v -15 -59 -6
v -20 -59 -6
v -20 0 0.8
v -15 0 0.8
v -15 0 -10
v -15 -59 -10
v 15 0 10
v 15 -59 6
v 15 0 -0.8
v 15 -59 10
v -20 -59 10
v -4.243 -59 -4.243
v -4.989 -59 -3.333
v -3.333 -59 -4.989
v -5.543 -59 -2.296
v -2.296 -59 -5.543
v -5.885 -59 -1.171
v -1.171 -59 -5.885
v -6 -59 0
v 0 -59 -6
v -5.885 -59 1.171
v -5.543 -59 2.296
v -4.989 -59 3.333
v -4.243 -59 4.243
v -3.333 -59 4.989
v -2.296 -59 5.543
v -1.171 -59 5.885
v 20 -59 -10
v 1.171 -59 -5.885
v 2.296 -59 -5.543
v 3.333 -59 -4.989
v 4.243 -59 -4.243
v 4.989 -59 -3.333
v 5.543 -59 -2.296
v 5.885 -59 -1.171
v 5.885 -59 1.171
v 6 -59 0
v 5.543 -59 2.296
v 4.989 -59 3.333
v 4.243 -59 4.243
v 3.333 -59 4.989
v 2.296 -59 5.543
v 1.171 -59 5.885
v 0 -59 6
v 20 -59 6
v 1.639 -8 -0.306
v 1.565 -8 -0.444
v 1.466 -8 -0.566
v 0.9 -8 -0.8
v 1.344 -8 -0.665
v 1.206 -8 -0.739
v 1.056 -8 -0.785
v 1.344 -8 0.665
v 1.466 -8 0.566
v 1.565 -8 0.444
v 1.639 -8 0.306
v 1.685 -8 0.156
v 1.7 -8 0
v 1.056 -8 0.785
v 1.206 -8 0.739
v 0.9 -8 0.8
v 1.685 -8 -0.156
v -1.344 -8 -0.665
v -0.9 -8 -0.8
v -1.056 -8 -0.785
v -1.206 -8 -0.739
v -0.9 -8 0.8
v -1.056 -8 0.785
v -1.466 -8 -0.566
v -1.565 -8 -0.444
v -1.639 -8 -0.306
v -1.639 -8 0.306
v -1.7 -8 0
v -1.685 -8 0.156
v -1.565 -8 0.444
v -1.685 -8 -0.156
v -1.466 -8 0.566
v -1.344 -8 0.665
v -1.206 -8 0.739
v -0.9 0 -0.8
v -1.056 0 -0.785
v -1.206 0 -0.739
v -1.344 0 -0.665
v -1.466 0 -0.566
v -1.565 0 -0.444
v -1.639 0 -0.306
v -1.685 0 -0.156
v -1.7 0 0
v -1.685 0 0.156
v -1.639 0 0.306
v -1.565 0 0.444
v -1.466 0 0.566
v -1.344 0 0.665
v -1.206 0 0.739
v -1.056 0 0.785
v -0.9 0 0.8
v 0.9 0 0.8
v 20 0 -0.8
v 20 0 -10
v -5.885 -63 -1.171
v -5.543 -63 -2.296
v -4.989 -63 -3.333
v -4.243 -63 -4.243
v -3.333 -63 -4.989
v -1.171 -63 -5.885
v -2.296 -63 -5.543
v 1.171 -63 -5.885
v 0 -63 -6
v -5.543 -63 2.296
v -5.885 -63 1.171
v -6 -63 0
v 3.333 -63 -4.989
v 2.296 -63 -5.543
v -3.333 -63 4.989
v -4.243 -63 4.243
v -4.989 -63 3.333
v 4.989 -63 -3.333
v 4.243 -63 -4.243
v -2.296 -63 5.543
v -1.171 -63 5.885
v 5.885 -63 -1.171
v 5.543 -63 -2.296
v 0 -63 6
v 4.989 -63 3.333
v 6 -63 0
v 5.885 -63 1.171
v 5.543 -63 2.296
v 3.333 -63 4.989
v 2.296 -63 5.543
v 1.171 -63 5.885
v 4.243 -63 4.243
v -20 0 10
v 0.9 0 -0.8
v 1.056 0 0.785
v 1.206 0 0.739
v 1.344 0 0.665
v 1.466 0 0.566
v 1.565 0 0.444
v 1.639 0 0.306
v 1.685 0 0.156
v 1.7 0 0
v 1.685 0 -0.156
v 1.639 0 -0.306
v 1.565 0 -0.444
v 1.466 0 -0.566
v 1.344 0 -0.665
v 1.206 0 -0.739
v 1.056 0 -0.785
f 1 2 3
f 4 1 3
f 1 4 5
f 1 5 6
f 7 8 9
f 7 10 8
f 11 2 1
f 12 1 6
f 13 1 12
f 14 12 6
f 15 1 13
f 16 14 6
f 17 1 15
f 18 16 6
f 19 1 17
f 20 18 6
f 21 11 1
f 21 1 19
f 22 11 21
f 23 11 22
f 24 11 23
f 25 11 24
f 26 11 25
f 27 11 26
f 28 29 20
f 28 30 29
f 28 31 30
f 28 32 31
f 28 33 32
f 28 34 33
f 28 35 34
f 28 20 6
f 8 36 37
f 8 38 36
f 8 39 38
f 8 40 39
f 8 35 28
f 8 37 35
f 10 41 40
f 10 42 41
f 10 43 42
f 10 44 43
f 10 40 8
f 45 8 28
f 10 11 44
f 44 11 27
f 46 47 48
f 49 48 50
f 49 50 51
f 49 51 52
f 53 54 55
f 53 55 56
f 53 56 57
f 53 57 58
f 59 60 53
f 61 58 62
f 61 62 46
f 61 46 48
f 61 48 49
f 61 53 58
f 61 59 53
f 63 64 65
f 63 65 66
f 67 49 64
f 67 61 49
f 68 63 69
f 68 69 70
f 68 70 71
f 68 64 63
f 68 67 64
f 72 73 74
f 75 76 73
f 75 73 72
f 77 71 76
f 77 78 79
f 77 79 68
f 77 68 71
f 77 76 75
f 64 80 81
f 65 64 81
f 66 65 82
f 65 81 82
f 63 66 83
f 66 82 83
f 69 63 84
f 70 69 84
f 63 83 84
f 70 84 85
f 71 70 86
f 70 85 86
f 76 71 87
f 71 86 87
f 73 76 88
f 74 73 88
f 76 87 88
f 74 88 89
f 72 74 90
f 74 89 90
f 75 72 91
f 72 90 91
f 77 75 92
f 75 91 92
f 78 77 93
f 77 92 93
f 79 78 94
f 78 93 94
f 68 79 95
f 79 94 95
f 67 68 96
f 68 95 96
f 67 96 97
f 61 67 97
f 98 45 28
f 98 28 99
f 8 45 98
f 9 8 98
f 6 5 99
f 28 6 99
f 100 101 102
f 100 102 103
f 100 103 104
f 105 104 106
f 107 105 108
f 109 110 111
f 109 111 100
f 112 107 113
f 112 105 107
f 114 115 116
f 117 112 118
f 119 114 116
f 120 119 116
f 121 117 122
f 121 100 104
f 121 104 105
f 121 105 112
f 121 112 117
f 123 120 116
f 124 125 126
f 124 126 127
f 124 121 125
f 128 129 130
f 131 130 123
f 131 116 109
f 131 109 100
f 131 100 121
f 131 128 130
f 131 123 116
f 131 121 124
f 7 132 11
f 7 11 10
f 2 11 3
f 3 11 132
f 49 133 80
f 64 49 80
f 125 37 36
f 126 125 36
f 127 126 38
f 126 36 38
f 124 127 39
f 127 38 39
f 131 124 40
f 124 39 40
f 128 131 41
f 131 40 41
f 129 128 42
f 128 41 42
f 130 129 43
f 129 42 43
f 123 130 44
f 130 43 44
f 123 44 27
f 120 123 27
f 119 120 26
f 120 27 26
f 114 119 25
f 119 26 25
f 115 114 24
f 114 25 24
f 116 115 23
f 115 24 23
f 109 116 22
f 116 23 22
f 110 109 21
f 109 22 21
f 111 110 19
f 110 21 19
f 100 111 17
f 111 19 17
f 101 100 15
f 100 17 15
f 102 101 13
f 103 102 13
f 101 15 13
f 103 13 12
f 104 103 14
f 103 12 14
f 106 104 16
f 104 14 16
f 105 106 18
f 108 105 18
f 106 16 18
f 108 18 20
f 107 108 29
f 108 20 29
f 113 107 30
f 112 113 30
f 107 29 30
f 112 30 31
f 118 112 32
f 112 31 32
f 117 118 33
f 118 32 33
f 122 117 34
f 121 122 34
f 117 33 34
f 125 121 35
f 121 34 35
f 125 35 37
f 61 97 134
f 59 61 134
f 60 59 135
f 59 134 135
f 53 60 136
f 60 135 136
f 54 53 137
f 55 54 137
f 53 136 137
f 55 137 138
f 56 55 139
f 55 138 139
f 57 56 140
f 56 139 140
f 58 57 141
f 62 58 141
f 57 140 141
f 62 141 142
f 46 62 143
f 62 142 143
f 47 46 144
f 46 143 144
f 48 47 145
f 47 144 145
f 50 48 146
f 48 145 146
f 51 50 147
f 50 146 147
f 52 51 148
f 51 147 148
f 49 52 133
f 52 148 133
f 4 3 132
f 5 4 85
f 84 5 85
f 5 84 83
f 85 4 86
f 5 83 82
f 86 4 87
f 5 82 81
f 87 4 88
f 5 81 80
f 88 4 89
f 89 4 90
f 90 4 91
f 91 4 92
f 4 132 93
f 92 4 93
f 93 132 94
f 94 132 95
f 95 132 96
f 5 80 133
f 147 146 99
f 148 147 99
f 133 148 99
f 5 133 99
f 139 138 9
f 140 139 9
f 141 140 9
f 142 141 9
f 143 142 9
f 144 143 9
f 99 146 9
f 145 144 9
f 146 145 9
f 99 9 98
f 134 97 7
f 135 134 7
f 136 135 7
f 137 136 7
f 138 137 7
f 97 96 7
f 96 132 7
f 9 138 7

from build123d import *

# Parameters (mm, degrees)
F0_W     = 40
F0_H     = 59
F1_DEPTH = 10
F3_DEPTH = 8
F4_R     = 6
F5_DEPTH = 4
F7_DEPTH = 5
F9_DEPTH = 5


with BuildPart() as f1:
    # F0 (on Top) → F1 (new body, symmetric)
    with BuildSketch(Plane.XY):
        with Locations((0, -29.5)):
            Rectangle(F0_W, F0_H)
    extrude(amount=F1_DEPTH, both=True)

    # F2 (on face) → F3 (cut)
    with BuildSketch(Plane(origin=(0, 0, 0), x_dir=(-1, 0, 0), z_dir=(0, 1, 0))):
        with BuildLine():
            Line((-0.9, -0.8), (0.9, -0.8))
            ThreePointArc((0.9, -0.8), (1.7, 0), (0.9, 0.8))
            Line((0.9, 0.8), (-0.9, 0.8))
            ThreePointArc((-0.9, 0.8), (-1.7, 0), (-0.9, -0.8))
        make_face()
    extrude(amount=-F3_DEPTH, mode=Mode.SUBTRACT)

    # F4 (on face) → F5 (join)
    with BuildSketch(Plane.XZ.offset(59)):
        Circle(F4_R)
    extrude(amount=F5_DEPTH)

    # F6 (on face) → F7 (cut)
    with BuildSketch(Plane(origin=(-20, 0, 0), x_dir=(0, -1, 0), z_dir=(-1, 0, 0))):
        Polygon((59, -6), (0, 0.8), (0, -10), (59, -10), align=None)
    extrude(amount=-F7_DEPTH, mode=Mode.SUBTRACT)

    # F8 (on face) → F9 (cut)
    with BuildSketch(Plane.YZ.offset(20)):
        Polygon((-59, 6), (0, -0.8), (0, 10), (-59, 10), align=None)
    extrude(amount=-F9_DEPTH, mode=Mode.SUBTRACT)


solid = f1.part
